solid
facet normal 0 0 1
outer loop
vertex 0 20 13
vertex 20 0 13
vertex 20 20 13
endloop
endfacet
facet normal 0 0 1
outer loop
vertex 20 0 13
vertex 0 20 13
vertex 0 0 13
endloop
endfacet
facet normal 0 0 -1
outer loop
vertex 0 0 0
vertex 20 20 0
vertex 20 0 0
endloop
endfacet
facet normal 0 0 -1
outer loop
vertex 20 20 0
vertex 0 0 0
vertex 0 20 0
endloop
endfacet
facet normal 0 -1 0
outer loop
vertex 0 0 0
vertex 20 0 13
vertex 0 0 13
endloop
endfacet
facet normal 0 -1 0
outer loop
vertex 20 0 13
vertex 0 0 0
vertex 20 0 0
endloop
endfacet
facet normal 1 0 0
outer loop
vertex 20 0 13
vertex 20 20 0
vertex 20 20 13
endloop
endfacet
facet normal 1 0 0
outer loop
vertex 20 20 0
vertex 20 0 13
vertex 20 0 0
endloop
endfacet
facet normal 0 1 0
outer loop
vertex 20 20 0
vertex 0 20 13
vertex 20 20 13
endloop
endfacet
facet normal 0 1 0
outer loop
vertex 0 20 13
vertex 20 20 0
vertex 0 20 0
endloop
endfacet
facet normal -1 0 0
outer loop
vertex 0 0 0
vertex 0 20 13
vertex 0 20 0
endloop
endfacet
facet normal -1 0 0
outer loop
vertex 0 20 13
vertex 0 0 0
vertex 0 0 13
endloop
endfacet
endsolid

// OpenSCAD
// Compared in a ternary and inside a module that takes the setting under the same name
lid_type = "snap"; // the lid
corner = "rounded";
module box(lid_type) {
  h = lid_type == "slide" ? 4 : lid_type == "none" ? 0 : 3;
  cube([20, 20, 10 + h]);
}
box(lid_type);
r = "sharp" == corner ? 0 : 2;
